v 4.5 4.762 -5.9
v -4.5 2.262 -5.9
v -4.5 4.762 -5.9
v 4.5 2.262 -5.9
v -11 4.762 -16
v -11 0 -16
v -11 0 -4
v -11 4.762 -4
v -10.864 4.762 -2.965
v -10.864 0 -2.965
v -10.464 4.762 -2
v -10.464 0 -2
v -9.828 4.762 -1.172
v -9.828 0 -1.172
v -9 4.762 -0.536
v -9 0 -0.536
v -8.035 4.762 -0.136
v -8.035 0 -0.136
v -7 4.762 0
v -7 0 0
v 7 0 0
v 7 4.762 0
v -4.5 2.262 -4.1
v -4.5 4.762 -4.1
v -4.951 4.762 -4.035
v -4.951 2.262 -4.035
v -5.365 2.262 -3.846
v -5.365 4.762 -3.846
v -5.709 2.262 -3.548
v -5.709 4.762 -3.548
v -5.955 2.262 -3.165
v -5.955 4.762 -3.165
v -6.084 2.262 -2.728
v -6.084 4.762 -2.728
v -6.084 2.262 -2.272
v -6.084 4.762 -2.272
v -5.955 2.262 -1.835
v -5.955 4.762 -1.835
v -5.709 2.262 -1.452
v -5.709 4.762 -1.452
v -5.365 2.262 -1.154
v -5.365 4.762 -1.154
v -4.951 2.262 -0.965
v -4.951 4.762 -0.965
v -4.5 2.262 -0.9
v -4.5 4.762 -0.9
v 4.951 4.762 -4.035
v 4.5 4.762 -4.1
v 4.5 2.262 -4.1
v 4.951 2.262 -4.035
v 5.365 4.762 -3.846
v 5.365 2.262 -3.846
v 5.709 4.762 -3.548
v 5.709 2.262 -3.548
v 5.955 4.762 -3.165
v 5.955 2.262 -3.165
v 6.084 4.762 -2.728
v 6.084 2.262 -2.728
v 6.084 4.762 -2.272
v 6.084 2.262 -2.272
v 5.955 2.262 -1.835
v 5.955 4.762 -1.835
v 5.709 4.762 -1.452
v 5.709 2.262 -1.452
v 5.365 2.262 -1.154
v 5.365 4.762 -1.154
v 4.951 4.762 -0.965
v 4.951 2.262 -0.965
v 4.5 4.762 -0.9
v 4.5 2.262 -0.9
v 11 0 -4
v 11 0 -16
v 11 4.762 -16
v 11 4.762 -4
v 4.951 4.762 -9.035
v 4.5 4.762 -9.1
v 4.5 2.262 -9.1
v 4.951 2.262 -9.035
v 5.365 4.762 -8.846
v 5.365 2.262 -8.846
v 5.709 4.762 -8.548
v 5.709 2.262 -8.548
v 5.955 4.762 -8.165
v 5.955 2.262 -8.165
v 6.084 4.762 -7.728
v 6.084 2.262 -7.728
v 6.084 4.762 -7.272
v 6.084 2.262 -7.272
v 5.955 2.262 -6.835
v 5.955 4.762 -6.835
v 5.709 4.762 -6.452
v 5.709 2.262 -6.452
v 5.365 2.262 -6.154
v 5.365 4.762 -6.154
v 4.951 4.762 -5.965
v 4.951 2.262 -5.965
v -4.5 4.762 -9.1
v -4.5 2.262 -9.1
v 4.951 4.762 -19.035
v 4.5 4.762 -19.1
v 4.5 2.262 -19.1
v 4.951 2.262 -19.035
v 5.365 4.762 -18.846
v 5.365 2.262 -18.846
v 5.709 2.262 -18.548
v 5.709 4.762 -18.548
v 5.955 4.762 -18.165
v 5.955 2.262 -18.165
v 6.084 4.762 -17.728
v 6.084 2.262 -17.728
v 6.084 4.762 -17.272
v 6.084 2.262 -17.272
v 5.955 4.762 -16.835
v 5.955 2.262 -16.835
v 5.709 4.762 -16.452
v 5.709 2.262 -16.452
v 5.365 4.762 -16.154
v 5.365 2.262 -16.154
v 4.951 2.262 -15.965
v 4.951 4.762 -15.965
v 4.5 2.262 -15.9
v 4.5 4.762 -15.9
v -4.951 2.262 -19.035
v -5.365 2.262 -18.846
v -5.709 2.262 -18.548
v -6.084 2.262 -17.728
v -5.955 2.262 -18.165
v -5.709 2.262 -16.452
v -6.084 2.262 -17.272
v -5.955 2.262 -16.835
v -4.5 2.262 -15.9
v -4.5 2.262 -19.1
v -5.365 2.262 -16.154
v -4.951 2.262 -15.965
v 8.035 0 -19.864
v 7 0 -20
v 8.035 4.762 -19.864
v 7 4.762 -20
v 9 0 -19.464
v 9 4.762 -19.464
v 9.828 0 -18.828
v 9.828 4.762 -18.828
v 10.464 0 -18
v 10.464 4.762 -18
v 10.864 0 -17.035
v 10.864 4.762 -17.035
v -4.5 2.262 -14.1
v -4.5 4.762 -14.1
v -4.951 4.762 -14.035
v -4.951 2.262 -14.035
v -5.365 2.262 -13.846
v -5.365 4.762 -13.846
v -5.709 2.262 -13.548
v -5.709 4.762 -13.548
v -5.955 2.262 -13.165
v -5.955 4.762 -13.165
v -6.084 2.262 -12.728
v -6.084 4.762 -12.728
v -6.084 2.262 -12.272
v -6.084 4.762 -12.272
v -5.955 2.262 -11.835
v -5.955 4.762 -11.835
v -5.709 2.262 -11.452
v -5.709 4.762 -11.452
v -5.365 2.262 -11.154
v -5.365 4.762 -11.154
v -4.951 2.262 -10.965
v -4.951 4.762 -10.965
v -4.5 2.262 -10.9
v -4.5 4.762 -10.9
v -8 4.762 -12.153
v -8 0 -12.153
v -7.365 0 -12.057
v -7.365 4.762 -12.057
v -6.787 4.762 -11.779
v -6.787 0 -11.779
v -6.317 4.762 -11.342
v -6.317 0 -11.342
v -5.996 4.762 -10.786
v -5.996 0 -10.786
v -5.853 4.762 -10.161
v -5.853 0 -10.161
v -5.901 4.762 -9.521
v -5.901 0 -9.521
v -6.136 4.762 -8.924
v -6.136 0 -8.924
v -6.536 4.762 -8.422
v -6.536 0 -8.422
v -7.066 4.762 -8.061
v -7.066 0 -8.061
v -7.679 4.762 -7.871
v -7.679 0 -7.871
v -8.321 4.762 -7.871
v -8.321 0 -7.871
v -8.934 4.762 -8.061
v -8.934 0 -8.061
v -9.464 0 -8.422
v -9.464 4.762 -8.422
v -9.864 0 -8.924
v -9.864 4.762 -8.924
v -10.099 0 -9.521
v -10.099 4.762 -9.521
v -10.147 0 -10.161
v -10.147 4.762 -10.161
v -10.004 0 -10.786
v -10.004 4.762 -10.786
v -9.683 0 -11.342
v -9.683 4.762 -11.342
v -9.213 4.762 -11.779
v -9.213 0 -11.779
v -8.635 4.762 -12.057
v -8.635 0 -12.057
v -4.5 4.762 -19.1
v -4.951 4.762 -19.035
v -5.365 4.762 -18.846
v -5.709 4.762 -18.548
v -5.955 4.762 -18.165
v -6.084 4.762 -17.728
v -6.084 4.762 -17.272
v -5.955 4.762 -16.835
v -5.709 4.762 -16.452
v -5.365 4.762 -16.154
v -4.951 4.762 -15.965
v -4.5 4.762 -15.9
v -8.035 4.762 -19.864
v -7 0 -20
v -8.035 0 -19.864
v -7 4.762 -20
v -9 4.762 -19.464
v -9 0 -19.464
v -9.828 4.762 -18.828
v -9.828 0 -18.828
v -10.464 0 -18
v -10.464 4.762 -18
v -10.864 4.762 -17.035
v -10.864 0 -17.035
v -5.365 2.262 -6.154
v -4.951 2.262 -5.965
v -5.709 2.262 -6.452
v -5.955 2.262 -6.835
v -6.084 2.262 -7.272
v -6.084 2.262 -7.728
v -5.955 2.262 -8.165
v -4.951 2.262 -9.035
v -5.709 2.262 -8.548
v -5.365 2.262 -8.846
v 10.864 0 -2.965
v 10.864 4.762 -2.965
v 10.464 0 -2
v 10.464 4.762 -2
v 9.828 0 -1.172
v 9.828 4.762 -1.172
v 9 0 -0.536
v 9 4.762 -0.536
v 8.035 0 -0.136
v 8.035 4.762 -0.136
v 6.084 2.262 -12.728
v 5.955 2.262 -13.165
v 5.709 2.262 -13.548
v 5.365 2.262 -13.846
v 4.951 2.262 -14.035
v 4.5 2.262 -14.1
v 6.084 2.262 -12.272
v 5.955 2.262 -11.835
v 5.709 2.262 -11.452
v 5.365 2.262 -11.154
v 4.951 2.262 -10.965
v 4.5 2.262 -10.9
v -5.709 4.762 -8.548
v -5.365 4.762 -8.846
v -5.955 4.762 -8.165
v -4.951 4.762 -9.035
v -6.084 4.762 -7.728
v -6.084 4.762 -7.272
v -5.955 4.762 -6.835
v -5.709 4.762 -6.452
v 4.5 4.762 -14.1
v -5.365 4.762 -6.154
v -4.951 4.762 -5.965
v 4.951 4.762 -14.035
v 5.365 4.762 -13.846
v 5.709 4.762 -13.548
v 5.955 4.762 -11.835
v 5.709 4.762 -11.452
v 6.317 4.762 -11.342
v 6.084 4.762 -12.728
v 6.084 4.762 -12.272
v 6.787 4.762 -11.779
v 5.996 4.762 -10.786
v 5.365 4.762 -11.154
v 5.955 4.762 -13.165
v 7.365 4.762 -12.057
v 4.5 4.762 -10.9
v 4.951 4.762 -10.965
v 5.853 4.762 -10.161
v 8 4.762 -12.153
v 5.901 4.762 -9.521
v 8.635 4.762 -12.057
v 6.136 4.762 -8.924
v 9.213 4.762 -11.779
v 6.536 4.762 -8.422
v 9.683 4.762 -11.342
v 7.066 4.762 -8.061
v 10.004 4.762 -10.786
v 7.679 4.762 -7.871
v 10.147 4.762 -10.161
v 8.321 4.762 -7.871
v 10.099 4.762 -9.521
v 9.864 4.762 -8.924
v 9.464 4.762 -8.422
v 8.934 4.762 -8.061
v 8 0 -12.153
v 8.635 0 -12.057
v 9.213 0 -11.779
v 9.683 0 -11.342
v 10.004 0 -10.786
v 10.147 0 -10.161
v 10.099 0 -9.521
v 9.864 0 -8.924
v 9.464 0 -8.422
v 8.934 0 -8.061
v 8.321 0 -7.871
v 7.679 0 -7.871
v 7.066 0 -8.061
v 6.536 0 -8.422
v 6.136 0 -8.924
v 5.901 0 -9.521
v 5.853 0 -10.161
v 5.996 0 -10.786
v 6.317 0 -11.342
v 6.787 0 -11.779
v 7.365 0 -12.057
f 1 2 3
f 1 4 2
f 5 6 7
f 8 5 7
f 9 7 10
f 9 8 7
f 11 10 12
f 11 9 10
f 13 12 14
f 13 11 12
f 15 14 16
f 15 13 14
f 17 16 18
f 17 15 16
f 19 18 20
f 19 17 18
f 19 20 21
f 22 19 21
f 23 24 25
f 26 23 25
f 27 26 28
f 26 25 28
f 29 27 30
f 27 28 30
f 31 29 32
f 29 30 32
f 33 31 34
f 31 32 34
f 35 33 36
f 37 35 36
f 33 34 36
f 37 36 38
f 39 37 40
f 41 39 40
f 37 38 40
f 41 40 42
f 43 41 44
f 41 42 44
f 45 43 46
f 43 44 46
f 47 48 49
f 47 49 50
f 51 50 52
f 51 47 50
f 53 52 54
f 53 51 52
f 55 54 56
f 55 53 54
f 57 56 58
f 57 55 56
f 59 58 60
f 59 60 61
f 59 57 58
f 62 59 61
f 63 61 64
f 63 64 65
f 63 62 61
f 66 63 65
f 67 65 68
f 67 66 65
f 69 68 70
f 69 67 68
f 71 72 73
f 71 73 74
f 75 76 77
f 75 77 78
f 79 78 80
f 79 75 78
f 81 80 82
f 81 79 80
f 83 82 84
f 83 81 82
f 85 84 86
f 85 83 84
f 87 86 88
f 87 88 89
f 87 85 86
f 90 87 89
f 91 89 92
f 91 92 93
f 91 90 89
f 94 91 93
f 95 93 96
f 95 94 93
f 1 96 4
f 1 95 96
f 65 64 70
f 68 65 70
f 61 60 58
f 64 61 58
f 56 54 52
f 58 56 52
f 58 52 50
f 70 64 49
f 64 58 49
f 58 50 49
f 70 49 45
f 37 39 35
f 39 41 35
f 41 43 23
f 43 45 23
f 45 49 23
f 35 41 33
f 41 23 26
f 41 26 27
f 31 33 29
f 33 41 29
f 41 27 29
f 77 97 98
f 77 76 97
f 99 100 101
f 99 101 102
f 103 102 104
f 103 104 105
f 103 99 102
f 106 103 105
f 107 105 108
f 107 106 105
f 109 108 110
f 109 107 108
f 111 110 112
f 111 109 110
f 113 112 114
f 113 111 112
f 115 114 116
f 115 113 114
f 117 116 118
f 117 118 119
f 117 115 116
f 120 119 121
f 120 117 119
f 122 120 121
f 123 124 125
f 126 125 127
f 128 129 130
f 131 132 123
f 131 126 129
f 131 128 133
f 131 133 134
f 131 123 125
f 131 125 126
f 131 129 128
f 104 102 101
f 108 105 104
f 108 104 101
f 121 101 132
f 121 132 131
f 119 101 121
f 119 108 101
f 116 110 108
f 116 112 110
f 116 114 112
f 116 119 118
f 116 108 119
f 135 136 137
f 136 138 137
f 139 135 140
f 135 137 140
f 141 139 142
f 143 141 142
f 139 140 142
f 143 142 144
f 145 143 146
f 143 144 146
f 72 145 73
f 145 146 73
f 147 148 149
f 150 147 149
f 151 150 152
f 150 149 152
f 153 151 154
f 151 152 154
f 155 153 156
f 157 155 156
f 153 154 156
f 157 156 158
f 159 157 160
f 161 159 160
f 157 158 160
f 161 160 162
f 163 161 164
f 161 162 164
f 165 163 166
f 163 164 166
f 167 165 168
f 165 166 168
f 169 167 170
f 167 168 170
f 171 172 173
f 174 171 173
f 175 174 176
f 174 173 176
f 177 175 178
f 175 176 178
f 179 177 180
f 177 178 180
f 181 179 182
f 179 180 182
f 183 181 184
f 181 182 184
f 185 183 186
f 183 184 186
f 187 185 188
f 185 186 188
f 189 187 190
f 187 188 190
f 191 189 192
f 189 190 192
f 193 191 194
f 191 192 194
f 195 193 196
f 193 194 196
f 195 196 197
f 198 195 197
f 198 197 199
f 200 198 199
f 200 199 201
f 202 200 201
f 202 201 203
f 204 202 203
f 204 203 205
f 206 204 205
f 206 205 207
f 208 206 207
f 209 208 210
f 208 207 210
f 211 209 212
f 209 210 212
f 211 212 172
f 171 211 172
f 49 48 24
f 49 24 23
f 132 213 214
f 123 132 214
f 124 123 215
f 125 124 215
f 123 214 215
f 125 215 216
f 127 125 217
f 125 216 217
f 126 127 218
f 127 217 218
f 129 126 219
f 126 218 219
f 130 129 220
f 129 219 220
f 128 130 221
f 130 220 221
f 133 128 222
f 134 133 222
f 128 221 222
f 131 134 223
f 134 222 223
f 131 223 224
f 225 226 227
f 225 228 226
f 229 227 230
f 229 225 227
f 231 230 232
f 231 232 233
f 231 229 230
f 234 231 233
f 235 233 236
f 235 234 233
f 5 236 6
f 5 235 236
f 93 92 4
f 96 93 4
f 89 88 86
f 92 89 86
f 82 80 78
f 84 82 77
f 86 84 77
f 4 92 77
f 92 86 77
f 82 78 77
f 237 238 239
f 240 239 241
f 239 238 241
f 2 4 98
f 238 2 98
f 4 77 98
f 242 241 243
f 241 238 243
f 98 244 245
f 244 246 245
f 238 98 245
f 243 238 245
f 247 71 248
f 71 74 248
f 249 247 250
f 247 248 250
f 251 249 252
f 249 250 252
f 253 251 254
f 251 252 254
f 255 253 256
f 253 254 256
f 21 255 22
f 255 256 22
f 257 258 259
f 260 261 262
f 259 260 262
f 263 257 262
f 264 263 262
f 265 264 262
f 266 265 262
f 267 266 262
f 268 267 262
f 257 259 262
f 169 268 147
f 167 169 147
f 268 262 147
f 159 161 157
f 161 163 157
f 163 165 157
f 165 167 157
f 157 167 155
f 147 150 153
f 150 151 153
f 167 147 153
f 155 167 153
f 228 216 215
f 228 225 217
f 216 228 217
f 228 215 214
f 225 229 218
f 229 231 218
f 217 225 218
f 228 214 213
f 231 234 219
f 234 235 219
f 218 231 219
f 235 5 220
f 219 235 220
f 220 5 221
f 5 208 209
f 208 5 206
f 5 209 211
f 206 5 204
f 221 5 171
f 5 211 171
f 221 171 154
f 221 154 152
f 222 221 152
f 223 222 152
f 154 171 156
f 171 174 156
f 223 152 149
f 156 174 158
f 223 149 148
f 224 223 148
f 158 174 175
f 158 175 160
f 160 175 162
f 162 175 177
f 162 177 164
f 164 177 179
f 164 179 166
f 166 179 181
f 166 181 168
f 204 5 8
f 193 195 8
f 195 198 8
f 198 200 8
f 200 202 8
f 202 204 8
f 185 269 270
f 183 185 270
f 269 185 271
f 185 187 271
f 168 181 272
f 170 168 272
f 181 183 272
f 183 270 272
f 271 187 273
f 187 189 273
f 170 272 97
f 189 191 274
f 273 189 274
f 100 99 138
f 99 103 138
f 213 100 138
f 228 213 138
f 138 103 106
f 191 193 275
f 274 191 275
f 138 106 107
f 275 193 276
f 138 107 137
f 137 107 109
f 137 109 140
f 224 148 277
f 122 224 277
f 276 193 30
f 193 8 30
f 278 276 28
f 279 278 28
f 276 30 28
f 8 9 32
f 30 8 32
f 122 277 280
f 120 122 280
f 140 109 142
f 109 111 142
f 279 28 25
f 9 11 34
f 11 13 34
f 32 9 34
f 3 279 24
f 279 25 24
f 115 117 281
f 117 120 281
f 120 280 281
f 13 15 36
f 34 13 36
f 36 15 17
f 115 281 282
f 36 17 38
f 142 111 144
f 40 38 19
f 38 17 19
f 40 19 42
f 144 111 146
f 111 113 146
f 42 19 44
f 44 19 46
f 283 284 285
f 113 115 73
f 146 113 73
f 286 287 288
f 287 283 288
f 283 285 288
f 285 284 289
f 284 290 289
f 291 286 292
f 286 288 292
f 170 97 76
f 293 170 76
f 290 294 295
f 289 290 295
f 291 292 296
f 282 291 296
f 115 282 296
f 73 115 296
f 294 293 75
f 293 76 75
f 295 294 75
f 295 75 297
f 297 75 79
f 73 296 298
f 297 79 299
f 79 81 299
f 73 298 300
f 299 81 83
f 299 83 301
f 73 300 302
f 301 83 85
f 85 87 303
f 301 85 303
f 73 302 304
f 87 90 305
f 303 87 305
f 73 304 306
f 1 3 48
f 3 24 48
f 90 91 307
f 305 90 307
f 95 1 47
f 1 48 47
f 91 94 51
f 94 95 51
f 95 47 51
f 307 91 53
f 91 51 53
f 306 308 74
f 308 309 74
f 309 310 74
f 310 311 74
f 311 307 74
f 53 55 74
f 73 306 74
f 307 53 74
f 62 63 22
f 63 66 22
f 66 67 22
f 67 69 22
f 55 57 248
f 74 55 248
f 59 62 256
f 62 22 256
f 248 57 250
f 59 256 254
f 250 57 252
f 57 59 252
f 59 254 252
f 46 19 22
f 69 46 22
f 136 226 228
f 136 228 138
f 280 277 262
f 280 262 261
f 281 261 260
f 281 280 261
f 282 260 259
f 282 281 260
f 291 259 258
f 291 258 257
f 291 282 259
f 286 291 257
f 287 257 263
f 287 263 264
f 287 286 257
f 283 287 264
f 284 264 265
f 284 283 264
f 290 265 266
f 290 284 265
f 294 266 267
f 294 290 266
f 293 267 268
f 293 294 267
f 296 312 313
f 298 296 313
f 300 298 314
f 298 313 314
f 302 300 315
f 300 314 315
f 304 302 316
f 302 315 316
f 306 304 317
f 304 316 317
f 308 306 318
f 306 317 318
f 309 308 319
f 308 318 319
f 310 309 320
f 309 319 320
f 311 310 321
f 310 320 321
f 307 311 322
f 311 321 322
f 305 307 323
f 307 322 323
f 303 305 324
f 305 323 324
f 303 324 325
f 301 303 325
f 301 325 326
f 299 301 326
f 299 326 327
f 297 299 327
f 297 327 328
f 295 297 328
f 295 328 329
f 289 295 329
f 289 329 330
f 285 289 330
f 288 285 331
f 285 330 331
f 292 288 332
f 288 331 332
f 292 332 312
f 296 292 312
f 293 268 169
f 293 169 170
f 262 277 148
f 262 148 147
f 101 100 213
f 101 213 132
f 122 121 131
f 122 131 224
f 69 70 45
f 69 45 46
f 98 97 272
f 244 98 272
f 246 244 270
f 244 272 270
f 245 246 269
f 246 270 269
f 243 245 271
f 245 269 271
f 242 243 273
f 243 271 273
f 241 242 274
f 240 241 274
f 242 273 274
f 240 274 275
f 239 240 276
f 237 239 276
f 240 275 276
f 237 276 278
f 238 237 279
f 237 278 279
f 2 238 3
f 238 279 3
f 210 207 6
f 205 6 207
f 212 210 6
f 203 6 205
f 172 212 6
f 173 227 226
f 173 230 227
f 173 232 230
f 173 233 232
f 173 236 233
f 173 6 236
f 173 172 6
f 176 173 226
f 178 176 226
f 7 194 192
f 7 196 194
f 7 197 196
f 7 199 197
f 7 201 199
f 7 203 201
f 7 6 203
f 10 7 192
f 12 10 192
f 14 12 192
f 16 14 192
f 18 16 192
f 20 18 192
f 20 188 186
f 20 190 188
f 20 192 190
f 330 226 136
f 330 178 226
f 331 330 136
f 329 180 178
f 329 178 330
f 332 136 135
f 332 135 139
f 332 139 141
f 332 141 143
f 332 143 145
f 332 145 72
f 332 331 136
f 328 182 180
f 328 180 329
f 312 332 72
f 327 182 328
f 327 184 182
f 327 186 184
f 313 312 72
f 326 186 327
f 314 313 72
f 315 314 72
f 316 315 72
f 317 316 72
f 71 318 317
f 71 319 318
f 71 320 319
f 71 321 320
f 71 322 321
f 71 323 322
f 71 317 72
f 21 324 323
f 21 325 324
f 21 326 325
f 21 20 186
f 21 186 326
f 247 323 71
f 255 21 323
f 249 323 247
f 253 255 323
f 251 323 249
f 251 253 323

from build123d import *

# Parameters (mm, degrees)
BOSS_EXTRUDE1_DEPTH = 4.5
SKETCH3_W           = 6.5
SKETCH3_H           = 20
SKETCH3_R           = 2.15265
BOSS_EXTRUDE2_DEPTH = 4.7625
CUT_EXTRUDE1_DEPTH  = 2.5
FILLET1_R           = 4


with BuildPart() as part:
    # Sketch1 → Boss-Extrude1 (new, symmetric)
    with BuildSketch(Plane(origin=(0, 0, 0), x_dir=(0, 0, -1), z_dir=(1, 0, 0))):
        Polygon((5.9, 2.2625), (5.9, 4.7625), (4.1, 4.7625), (4.1, 2.2625), (0.9, 2.2625), (0.9, 4.7625), (0, 4.7625), (0, 0), (20, 0), (20, 4.7625), (19.1, 4.7625), (19.1, 2.2625), (15.9, 2.2625), (15.9, 4.7625), (14.1, 4.7625), (14.1, 2.2625), (10.9, 2.2625), (10.9, 4.7625), (9.1, 4.7625), (9.1, 2.2625), align=None)
    extrude(amount=BOSS_EXTRUDE1_DEPTH, both=True)

    # Sketch3 → Boss-Extrude2 (add)
    # profile 1 of 2: a face of its own
    with BuildSketch(Plane.XZ):
        with Locations((7.75, -10)):
            Rectangle(SKETCH3_W, SKETCH3_H)
        with Locations(Location((8, -10, 0), (0, 0, 270))):
            Circle(SKETCH3_R, mode=Mode.SUBTRACT)
    # profile 2 of 2: a face of its own
    with BuildSketch(Plane.XZ):
        with Locations((-7.75, -10)):
            Rectangle(SKETCH3_W, SKETCH3_H)
        with Locations(Location((-8, -10, 0), (0, 0, 270))):
            Circle(SKETCH3_R, mode=Mode.SUBTRACT)
    extrude(amount=-BOSS_EXTRUDE2_DEPTH)

    # Sketch4 → Cut-Extrude1 (cut)
    with BuildSketch(Plane(origin=(0, 4.7625, 0), x_dir=(1, 0, 0), z_dir=(0, 1, 0))):
        with BuildLine():
            Line((4.5, 0.9), (4.5, 4.1))
            ThreePointArc((4.5, 4.1), (6.1, 2.5), (4.5, 0.9))
        make_face()
        with BuildLine():
            Line((4.5, 5.9), (4.5, 9.1))
            ThreePointArc((4.5, 9.1), (6.1, 7.5), (4.5, 5.9))
        make_face()
        with BuildLine():
            Line((4.5, 10.9), (4.5, 14.1))
            ThreePointArc((4.5, 14.1), (6.1, 12.5), (4.5, 10.9))
        make_face()
        with BuildLine():
            Line((4.5, 15.9), (4.5, 19.1))
            ThreePointArc((4.5, 19.1), (6.1, 17.5), (4.5, 15.9))
        make_face()
        with BuildLine():
            Line((-4.5, 15.9), (-4.5, 19.1))
            ThreePointArc((-4.5, 19.1), (-6.1, 17.5), (-4.5, 15.9))
        make_face()
        with BuildLine():
            Line((-4.5, 10.9), (-4.5, 14.1))
            ThreePointArc((-4.5, 14.1), (-6.1, 12.5), (-4.5, 10.9))
        make_face()
        with BuildLine():
            Line((-4.5, 5.9), (-4.5, 9.1))
            ThreePointArc((-4.5, 9.1), (-6.1, 7.5), (-4.5, 5.9))
        make_face()
        with BuildLine():
            Line((-4.5, 0.9), (-4.5, 4.1))
            ThreePointArc((-4.5, 4.1), (-6.1, 2.5), (-4.5, 0.9))
        make_face()
    extrude(amount=-CUT_EXTRUDE1_DEPTH, mode=Mode.SUBTRACT)

    # Fillet1
    fillet1_edges = [part.edges().sort_by_distance(p)[0] for p in [
        (11, 2.38125, 0),
        (11, 2.38125, -20),
        (-11, 2.38125, -20),
        (-11, 2.38125, 0),
    ]]
    fillet(fillet1_edges, radius=FILLET1_R)


solid = part.part
